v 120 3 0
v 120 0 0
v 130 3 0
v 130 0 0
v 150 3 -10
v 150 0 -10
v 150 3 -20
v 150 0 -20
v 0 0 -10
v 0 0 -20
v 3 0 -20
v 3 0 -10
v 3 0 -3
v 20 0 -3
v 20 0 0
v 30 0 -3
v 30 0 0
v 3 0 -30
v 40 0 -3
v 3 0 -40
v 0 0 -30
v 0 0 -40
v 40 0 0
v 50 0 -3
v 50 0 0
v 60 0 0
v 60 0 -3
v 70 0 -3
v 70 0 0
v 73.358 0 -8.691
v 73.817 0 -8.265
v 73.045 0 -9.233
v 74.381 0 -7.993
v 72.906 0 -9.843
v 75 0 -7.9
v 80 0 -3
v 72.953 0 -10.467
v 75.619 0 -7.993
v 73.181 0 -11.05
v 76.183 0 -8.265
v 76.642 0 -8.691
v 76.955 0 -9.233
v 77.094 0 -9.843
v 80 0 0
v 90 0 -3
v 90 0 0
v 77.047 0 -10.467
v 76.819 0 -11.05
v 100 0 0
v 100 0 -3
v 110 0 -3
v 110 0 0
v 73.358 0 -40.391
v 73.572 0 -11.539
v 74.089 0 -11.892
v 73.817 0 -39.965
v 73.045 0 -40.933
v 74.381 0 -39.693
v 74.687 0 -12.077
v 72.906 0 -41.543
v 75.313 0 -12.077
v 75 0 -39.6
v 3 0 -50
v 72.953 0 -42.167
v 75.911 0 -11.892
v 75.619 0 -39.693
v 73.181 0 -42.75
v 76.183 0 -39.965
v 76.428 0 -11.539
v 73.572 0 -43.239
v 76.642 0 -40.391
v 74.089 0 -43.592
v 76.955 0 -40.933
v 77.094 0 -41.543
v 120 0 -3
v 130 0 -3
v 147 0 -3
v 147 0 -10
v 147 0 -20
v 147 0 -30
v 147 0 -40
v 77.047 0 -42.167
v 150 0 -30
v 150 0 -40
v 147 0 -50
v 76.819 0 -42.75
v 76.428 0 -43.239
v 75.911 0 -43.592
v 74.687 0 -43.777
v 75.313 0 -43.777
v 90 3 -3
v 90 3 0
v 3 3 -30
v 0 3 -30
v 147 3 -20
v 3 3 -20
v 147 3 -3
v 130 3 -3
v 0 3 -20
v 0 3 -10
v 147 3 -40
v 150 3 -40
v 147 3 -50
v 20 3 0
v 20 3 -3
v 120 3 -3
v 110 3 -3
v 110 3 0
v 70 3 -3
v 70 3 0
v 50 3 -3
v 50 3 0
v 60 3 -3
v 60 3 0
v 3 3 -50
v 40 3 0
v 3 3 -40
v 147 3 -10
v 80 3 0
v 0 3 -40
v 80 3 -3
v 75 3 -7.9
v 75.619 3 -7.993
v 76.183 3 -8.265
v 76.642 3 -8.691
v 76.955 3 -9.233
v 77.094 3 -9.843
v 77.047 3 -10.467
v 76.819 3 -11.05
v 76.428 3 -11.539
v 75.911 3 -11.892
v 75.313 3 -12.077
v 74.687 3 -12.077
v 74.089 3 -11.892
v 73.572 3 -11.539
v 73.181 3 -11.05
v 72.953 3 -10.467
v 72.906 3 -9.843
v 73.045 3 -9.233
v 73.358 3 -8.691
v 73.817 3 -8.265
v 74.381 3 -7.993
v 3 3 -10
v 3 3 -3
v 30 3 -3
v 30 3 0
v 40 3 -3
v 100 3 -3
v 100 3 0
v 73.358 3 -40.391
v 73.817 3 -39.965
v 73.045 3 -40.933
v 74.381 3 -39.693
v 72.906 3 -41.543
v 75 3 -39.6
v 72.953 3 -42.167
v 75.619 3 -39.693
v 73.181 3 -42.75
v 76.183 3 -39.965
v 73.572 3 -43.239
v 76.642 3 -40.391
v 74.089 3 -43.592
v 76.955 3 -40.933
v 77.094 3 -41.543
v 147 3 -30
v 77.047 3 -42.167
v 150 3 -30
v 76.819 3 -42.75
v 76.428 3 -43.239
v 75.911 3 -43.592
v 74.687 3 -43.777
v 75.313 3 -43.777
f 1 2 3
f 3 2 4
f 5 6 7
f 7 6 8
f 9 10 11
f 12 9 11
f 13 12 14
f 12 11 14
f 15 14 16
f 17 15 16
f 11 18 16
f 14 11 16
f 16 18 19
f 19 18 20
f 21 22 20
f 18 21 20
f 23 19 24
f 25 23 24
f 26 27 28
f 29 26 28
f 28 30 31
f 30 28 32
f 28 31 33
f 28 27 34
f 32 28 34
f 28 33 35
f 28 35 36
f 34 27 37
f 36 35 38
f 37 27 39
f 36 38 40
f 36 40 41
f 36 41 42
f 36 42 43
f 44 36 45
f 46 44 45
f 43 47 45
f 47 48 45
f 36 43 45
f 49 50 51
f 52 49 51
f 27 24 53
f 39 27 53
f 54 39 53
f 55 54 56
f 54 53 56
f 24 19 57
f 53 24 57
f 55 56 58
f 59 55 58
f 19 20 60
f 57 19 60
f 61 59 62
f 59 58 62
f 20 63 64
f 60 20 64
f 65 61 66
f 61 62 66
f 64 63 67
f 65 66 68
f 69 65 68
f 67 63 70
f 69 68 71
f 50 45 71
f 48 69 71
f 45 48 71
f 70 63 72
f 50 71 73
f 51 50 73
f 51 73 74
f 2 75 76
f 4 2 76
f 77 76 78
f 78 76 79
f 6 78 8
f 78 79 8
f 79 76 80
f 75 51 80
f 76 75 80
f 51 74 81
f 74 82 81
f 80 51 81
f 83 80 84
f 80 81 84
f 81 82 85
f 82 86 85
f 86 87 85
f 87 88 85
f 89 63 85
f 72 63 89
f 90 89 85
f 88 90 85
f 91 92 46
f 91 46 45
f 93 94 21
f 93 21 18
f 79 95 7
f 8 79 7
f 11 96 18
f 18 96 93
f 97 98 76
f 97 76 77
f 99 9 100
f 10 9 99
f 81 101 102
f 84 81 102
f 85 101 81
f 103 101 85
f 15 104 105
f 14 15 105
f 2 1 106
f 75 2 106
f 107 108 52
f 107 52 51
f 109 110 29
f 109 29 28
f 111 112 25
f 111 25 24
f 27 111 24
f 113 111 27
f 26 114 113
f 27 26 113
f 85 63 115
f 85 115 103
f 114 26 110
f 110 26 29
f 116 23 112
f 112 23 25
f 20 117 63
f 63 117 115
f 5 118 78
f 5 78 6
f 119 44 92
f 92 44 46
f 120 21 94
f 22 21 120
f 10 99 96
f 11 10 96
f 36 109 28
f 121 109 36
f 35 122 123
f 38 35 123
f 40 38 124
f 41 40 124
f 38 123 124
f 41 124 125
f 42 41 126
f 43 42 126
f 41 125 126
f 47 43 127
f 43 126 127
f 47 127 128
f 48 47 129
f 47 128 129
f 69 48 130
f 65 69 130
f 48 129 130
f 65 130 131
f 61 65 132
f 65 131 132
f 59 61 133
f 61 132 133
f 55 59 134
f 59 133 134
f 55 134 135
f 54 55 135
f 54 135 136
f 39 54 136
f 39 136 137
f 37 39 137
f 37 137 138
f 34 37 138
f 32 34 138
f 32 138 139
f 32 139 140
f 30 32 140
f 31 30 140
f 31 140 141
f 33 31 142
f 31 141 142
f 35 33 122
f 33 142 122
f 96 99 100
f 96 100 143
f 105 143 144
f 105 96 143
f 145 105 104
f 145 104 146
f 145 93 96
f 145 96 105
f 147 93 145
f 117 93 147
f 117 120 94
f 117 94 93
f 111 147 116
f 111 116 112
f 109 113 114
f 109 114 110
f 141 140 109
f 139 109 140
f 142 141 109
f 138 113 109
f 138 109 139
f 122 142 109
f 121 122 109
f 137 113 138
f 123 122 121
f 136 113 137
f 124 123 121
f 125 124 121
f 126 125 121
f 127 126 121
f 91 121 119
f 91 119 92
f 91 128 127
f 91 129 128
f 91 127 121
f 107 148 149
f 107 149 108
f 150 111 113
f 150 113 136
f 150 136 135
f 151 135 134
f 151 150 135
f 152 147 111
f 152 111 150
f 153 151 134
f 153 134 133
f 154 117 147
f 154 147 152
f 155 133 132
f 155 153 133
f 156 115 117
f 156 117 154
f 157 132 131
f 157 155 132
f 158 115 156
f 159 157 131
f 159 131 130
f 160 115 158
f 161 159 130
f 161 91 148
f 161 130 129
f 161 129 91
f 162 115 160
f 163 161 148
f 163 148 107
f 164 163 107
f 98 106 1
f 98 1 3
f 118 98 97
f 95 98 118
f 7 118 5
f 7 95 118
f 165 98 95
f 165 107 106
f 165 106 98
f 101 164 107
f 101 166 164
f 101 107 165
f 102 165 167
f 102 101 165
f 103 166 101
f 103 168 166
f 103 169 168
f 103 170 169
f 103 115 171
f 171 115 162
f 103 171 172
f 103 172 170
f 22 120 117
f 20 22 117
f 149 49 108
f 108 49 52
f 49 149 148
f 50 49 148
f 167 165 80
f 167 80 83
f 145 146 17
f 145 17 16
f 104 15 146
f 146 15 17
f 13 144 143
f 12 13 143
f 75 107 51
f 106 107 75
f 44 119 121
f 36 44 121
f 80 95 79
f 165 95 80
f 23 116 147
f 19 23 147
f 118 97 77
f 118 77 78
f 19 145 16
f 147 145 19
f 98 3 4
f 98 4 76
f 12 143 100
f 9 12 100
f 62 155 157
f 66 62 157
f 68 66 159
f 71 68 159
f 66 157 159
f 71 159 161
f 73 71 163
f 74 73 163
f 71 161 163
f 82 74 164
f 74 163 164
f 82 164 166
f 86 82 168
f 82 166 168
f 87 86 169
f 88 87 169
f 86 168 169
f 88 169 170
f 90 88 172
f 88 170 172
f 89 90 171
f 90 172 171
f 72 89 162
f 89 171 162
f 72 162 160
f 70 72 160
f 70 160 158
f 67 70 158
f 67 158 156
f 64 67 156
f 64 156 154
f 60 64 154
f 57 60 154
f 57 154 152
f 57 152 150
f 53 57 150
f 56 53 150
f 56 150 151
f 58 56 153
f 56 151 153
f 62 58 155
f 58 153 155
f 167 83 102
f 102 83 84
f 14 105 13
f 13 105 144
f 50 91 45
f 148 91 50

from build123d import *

# Parameters (mm, degrees)
MDFESB_W       = 150
MDFESB_H       = 50
MDF_DEPTH      = 3
ENCAIXEESB_W   = 10
ENCAIXEESB_H   = 3
ENCAIXEESB_W_2 = 3
ENCAIXEESB_H_2 = 10
ENCAIXE_DEPTH  = 3
USESB_R        = 2.1
US_DEPTH       = 3


with BuildPart() as part:
    # mdfEsb → mdf (new body)
    with BuildSketch(Plane(origin=(0, 0, 0), x_dir=(1, 0, 0), z_dir=(0, 1, 0))):
        with Locations((75, 25)):
            Rectangle(MDFESB_W, MDFESB_H)
    extrude(amount=MDF_DEPTH)

    # encaixeEsb → encaixe (cut)
    with BuildSketch(Plane(origin=(0, 3, 0), x_dir=(1, 0, 0), z_dir=(0, 1, 0))):
        Polygon((0, 0), (20, 0), (20, 3), (3, 3), (3, 10), (0, 10), (0, 3), align=None)
        Polygon((150, 0), (130, 0), (130, 3), (147, 3), (147, 10), (150, 10), (150, 3), align=None)
        with Locations((35, 1.5)):
            Rectangle(ENCAIXEESB_W, ENCAIXEESB_H)
        with Locations((55, 1.5)):
            Rectangle(ENCAIXEESB_W, ENCAIXEESB_H)
        with Locations((75, 1.5)):
            Rectangle(ENCAIXEESB_W, ENCAIXEESB_H)
        with Locations((95, 1.5)):
            Rectangle(ENCAIXEESB_W, ENCAIXEESB_H)
        with Locations((115, 1.5)):
            Rectangle(ENCAIXEESB_W, ENCAIXEESB_H)
        with Locations((1.5, 25)):
            Rectangle(ENCAIXEESB_W_2, ENCAIXEESB_H_2)
        with Locations((1.5, 45)):
            Rectangle(ENCAIXEESB_W_2, ENCAIXEESB_H_2)
        with Locations((1.5, 65)):
            Rectangle(ENCAIXEESB_W_2, ENCAIXEESB_H_2)
        with Locations((1.5, 85)):
            Rectangle(ENCAIXEESB_W_2, ENCAIXEESB_H_2)
        with Locations((1.5, 105)):
            Rectangle(ENCAIXEESB_W_2, ENCAIXEESB_H_2)
        with Locations((148.5, 105)):
            Rectangle(ENCAIXEESB_W_2, ENCAIXEESB_H_2)
        with Locations((148.5, 85)):
            Rectangle(ENCAIXEESB_W_2, ENCAIXEESB_H_2)
        with Locations((148.5, 65)):
            Rectangle(ENCAIXEESB_W_2, ENCAIXEESB_H_2)
        with Locations((148.5, 45)):
            Rectangle(ENCAIXEESB_W_2, ENCAIXEESB_H_2)
        with Locations((148.5, 25)):
            Rectangle(ENCAIXEESB_W_2, ENCAIXEESB_H_2)
    extrude(amount=-ENCAIXE_DEPTH, mode=Mode.SUBTRACT)

    # USEsb → US (cut)
    with BuildSketch(Plane(origin=(0, 3, 0), x_dir=(1, 0, 0), z_dir=(0, 1, 0))):
        with Locations(Location((75, 41.7, 0), (0, 0, 270))):
            Circle(USESB_R)
        with Locations(Location((75, 10, 0), (0, 0, 270))):
            Circle(USESB_R)
    extrude(amount=-US_DEPTH, mode=Mode.SUBTRACT)


solid = part.part
